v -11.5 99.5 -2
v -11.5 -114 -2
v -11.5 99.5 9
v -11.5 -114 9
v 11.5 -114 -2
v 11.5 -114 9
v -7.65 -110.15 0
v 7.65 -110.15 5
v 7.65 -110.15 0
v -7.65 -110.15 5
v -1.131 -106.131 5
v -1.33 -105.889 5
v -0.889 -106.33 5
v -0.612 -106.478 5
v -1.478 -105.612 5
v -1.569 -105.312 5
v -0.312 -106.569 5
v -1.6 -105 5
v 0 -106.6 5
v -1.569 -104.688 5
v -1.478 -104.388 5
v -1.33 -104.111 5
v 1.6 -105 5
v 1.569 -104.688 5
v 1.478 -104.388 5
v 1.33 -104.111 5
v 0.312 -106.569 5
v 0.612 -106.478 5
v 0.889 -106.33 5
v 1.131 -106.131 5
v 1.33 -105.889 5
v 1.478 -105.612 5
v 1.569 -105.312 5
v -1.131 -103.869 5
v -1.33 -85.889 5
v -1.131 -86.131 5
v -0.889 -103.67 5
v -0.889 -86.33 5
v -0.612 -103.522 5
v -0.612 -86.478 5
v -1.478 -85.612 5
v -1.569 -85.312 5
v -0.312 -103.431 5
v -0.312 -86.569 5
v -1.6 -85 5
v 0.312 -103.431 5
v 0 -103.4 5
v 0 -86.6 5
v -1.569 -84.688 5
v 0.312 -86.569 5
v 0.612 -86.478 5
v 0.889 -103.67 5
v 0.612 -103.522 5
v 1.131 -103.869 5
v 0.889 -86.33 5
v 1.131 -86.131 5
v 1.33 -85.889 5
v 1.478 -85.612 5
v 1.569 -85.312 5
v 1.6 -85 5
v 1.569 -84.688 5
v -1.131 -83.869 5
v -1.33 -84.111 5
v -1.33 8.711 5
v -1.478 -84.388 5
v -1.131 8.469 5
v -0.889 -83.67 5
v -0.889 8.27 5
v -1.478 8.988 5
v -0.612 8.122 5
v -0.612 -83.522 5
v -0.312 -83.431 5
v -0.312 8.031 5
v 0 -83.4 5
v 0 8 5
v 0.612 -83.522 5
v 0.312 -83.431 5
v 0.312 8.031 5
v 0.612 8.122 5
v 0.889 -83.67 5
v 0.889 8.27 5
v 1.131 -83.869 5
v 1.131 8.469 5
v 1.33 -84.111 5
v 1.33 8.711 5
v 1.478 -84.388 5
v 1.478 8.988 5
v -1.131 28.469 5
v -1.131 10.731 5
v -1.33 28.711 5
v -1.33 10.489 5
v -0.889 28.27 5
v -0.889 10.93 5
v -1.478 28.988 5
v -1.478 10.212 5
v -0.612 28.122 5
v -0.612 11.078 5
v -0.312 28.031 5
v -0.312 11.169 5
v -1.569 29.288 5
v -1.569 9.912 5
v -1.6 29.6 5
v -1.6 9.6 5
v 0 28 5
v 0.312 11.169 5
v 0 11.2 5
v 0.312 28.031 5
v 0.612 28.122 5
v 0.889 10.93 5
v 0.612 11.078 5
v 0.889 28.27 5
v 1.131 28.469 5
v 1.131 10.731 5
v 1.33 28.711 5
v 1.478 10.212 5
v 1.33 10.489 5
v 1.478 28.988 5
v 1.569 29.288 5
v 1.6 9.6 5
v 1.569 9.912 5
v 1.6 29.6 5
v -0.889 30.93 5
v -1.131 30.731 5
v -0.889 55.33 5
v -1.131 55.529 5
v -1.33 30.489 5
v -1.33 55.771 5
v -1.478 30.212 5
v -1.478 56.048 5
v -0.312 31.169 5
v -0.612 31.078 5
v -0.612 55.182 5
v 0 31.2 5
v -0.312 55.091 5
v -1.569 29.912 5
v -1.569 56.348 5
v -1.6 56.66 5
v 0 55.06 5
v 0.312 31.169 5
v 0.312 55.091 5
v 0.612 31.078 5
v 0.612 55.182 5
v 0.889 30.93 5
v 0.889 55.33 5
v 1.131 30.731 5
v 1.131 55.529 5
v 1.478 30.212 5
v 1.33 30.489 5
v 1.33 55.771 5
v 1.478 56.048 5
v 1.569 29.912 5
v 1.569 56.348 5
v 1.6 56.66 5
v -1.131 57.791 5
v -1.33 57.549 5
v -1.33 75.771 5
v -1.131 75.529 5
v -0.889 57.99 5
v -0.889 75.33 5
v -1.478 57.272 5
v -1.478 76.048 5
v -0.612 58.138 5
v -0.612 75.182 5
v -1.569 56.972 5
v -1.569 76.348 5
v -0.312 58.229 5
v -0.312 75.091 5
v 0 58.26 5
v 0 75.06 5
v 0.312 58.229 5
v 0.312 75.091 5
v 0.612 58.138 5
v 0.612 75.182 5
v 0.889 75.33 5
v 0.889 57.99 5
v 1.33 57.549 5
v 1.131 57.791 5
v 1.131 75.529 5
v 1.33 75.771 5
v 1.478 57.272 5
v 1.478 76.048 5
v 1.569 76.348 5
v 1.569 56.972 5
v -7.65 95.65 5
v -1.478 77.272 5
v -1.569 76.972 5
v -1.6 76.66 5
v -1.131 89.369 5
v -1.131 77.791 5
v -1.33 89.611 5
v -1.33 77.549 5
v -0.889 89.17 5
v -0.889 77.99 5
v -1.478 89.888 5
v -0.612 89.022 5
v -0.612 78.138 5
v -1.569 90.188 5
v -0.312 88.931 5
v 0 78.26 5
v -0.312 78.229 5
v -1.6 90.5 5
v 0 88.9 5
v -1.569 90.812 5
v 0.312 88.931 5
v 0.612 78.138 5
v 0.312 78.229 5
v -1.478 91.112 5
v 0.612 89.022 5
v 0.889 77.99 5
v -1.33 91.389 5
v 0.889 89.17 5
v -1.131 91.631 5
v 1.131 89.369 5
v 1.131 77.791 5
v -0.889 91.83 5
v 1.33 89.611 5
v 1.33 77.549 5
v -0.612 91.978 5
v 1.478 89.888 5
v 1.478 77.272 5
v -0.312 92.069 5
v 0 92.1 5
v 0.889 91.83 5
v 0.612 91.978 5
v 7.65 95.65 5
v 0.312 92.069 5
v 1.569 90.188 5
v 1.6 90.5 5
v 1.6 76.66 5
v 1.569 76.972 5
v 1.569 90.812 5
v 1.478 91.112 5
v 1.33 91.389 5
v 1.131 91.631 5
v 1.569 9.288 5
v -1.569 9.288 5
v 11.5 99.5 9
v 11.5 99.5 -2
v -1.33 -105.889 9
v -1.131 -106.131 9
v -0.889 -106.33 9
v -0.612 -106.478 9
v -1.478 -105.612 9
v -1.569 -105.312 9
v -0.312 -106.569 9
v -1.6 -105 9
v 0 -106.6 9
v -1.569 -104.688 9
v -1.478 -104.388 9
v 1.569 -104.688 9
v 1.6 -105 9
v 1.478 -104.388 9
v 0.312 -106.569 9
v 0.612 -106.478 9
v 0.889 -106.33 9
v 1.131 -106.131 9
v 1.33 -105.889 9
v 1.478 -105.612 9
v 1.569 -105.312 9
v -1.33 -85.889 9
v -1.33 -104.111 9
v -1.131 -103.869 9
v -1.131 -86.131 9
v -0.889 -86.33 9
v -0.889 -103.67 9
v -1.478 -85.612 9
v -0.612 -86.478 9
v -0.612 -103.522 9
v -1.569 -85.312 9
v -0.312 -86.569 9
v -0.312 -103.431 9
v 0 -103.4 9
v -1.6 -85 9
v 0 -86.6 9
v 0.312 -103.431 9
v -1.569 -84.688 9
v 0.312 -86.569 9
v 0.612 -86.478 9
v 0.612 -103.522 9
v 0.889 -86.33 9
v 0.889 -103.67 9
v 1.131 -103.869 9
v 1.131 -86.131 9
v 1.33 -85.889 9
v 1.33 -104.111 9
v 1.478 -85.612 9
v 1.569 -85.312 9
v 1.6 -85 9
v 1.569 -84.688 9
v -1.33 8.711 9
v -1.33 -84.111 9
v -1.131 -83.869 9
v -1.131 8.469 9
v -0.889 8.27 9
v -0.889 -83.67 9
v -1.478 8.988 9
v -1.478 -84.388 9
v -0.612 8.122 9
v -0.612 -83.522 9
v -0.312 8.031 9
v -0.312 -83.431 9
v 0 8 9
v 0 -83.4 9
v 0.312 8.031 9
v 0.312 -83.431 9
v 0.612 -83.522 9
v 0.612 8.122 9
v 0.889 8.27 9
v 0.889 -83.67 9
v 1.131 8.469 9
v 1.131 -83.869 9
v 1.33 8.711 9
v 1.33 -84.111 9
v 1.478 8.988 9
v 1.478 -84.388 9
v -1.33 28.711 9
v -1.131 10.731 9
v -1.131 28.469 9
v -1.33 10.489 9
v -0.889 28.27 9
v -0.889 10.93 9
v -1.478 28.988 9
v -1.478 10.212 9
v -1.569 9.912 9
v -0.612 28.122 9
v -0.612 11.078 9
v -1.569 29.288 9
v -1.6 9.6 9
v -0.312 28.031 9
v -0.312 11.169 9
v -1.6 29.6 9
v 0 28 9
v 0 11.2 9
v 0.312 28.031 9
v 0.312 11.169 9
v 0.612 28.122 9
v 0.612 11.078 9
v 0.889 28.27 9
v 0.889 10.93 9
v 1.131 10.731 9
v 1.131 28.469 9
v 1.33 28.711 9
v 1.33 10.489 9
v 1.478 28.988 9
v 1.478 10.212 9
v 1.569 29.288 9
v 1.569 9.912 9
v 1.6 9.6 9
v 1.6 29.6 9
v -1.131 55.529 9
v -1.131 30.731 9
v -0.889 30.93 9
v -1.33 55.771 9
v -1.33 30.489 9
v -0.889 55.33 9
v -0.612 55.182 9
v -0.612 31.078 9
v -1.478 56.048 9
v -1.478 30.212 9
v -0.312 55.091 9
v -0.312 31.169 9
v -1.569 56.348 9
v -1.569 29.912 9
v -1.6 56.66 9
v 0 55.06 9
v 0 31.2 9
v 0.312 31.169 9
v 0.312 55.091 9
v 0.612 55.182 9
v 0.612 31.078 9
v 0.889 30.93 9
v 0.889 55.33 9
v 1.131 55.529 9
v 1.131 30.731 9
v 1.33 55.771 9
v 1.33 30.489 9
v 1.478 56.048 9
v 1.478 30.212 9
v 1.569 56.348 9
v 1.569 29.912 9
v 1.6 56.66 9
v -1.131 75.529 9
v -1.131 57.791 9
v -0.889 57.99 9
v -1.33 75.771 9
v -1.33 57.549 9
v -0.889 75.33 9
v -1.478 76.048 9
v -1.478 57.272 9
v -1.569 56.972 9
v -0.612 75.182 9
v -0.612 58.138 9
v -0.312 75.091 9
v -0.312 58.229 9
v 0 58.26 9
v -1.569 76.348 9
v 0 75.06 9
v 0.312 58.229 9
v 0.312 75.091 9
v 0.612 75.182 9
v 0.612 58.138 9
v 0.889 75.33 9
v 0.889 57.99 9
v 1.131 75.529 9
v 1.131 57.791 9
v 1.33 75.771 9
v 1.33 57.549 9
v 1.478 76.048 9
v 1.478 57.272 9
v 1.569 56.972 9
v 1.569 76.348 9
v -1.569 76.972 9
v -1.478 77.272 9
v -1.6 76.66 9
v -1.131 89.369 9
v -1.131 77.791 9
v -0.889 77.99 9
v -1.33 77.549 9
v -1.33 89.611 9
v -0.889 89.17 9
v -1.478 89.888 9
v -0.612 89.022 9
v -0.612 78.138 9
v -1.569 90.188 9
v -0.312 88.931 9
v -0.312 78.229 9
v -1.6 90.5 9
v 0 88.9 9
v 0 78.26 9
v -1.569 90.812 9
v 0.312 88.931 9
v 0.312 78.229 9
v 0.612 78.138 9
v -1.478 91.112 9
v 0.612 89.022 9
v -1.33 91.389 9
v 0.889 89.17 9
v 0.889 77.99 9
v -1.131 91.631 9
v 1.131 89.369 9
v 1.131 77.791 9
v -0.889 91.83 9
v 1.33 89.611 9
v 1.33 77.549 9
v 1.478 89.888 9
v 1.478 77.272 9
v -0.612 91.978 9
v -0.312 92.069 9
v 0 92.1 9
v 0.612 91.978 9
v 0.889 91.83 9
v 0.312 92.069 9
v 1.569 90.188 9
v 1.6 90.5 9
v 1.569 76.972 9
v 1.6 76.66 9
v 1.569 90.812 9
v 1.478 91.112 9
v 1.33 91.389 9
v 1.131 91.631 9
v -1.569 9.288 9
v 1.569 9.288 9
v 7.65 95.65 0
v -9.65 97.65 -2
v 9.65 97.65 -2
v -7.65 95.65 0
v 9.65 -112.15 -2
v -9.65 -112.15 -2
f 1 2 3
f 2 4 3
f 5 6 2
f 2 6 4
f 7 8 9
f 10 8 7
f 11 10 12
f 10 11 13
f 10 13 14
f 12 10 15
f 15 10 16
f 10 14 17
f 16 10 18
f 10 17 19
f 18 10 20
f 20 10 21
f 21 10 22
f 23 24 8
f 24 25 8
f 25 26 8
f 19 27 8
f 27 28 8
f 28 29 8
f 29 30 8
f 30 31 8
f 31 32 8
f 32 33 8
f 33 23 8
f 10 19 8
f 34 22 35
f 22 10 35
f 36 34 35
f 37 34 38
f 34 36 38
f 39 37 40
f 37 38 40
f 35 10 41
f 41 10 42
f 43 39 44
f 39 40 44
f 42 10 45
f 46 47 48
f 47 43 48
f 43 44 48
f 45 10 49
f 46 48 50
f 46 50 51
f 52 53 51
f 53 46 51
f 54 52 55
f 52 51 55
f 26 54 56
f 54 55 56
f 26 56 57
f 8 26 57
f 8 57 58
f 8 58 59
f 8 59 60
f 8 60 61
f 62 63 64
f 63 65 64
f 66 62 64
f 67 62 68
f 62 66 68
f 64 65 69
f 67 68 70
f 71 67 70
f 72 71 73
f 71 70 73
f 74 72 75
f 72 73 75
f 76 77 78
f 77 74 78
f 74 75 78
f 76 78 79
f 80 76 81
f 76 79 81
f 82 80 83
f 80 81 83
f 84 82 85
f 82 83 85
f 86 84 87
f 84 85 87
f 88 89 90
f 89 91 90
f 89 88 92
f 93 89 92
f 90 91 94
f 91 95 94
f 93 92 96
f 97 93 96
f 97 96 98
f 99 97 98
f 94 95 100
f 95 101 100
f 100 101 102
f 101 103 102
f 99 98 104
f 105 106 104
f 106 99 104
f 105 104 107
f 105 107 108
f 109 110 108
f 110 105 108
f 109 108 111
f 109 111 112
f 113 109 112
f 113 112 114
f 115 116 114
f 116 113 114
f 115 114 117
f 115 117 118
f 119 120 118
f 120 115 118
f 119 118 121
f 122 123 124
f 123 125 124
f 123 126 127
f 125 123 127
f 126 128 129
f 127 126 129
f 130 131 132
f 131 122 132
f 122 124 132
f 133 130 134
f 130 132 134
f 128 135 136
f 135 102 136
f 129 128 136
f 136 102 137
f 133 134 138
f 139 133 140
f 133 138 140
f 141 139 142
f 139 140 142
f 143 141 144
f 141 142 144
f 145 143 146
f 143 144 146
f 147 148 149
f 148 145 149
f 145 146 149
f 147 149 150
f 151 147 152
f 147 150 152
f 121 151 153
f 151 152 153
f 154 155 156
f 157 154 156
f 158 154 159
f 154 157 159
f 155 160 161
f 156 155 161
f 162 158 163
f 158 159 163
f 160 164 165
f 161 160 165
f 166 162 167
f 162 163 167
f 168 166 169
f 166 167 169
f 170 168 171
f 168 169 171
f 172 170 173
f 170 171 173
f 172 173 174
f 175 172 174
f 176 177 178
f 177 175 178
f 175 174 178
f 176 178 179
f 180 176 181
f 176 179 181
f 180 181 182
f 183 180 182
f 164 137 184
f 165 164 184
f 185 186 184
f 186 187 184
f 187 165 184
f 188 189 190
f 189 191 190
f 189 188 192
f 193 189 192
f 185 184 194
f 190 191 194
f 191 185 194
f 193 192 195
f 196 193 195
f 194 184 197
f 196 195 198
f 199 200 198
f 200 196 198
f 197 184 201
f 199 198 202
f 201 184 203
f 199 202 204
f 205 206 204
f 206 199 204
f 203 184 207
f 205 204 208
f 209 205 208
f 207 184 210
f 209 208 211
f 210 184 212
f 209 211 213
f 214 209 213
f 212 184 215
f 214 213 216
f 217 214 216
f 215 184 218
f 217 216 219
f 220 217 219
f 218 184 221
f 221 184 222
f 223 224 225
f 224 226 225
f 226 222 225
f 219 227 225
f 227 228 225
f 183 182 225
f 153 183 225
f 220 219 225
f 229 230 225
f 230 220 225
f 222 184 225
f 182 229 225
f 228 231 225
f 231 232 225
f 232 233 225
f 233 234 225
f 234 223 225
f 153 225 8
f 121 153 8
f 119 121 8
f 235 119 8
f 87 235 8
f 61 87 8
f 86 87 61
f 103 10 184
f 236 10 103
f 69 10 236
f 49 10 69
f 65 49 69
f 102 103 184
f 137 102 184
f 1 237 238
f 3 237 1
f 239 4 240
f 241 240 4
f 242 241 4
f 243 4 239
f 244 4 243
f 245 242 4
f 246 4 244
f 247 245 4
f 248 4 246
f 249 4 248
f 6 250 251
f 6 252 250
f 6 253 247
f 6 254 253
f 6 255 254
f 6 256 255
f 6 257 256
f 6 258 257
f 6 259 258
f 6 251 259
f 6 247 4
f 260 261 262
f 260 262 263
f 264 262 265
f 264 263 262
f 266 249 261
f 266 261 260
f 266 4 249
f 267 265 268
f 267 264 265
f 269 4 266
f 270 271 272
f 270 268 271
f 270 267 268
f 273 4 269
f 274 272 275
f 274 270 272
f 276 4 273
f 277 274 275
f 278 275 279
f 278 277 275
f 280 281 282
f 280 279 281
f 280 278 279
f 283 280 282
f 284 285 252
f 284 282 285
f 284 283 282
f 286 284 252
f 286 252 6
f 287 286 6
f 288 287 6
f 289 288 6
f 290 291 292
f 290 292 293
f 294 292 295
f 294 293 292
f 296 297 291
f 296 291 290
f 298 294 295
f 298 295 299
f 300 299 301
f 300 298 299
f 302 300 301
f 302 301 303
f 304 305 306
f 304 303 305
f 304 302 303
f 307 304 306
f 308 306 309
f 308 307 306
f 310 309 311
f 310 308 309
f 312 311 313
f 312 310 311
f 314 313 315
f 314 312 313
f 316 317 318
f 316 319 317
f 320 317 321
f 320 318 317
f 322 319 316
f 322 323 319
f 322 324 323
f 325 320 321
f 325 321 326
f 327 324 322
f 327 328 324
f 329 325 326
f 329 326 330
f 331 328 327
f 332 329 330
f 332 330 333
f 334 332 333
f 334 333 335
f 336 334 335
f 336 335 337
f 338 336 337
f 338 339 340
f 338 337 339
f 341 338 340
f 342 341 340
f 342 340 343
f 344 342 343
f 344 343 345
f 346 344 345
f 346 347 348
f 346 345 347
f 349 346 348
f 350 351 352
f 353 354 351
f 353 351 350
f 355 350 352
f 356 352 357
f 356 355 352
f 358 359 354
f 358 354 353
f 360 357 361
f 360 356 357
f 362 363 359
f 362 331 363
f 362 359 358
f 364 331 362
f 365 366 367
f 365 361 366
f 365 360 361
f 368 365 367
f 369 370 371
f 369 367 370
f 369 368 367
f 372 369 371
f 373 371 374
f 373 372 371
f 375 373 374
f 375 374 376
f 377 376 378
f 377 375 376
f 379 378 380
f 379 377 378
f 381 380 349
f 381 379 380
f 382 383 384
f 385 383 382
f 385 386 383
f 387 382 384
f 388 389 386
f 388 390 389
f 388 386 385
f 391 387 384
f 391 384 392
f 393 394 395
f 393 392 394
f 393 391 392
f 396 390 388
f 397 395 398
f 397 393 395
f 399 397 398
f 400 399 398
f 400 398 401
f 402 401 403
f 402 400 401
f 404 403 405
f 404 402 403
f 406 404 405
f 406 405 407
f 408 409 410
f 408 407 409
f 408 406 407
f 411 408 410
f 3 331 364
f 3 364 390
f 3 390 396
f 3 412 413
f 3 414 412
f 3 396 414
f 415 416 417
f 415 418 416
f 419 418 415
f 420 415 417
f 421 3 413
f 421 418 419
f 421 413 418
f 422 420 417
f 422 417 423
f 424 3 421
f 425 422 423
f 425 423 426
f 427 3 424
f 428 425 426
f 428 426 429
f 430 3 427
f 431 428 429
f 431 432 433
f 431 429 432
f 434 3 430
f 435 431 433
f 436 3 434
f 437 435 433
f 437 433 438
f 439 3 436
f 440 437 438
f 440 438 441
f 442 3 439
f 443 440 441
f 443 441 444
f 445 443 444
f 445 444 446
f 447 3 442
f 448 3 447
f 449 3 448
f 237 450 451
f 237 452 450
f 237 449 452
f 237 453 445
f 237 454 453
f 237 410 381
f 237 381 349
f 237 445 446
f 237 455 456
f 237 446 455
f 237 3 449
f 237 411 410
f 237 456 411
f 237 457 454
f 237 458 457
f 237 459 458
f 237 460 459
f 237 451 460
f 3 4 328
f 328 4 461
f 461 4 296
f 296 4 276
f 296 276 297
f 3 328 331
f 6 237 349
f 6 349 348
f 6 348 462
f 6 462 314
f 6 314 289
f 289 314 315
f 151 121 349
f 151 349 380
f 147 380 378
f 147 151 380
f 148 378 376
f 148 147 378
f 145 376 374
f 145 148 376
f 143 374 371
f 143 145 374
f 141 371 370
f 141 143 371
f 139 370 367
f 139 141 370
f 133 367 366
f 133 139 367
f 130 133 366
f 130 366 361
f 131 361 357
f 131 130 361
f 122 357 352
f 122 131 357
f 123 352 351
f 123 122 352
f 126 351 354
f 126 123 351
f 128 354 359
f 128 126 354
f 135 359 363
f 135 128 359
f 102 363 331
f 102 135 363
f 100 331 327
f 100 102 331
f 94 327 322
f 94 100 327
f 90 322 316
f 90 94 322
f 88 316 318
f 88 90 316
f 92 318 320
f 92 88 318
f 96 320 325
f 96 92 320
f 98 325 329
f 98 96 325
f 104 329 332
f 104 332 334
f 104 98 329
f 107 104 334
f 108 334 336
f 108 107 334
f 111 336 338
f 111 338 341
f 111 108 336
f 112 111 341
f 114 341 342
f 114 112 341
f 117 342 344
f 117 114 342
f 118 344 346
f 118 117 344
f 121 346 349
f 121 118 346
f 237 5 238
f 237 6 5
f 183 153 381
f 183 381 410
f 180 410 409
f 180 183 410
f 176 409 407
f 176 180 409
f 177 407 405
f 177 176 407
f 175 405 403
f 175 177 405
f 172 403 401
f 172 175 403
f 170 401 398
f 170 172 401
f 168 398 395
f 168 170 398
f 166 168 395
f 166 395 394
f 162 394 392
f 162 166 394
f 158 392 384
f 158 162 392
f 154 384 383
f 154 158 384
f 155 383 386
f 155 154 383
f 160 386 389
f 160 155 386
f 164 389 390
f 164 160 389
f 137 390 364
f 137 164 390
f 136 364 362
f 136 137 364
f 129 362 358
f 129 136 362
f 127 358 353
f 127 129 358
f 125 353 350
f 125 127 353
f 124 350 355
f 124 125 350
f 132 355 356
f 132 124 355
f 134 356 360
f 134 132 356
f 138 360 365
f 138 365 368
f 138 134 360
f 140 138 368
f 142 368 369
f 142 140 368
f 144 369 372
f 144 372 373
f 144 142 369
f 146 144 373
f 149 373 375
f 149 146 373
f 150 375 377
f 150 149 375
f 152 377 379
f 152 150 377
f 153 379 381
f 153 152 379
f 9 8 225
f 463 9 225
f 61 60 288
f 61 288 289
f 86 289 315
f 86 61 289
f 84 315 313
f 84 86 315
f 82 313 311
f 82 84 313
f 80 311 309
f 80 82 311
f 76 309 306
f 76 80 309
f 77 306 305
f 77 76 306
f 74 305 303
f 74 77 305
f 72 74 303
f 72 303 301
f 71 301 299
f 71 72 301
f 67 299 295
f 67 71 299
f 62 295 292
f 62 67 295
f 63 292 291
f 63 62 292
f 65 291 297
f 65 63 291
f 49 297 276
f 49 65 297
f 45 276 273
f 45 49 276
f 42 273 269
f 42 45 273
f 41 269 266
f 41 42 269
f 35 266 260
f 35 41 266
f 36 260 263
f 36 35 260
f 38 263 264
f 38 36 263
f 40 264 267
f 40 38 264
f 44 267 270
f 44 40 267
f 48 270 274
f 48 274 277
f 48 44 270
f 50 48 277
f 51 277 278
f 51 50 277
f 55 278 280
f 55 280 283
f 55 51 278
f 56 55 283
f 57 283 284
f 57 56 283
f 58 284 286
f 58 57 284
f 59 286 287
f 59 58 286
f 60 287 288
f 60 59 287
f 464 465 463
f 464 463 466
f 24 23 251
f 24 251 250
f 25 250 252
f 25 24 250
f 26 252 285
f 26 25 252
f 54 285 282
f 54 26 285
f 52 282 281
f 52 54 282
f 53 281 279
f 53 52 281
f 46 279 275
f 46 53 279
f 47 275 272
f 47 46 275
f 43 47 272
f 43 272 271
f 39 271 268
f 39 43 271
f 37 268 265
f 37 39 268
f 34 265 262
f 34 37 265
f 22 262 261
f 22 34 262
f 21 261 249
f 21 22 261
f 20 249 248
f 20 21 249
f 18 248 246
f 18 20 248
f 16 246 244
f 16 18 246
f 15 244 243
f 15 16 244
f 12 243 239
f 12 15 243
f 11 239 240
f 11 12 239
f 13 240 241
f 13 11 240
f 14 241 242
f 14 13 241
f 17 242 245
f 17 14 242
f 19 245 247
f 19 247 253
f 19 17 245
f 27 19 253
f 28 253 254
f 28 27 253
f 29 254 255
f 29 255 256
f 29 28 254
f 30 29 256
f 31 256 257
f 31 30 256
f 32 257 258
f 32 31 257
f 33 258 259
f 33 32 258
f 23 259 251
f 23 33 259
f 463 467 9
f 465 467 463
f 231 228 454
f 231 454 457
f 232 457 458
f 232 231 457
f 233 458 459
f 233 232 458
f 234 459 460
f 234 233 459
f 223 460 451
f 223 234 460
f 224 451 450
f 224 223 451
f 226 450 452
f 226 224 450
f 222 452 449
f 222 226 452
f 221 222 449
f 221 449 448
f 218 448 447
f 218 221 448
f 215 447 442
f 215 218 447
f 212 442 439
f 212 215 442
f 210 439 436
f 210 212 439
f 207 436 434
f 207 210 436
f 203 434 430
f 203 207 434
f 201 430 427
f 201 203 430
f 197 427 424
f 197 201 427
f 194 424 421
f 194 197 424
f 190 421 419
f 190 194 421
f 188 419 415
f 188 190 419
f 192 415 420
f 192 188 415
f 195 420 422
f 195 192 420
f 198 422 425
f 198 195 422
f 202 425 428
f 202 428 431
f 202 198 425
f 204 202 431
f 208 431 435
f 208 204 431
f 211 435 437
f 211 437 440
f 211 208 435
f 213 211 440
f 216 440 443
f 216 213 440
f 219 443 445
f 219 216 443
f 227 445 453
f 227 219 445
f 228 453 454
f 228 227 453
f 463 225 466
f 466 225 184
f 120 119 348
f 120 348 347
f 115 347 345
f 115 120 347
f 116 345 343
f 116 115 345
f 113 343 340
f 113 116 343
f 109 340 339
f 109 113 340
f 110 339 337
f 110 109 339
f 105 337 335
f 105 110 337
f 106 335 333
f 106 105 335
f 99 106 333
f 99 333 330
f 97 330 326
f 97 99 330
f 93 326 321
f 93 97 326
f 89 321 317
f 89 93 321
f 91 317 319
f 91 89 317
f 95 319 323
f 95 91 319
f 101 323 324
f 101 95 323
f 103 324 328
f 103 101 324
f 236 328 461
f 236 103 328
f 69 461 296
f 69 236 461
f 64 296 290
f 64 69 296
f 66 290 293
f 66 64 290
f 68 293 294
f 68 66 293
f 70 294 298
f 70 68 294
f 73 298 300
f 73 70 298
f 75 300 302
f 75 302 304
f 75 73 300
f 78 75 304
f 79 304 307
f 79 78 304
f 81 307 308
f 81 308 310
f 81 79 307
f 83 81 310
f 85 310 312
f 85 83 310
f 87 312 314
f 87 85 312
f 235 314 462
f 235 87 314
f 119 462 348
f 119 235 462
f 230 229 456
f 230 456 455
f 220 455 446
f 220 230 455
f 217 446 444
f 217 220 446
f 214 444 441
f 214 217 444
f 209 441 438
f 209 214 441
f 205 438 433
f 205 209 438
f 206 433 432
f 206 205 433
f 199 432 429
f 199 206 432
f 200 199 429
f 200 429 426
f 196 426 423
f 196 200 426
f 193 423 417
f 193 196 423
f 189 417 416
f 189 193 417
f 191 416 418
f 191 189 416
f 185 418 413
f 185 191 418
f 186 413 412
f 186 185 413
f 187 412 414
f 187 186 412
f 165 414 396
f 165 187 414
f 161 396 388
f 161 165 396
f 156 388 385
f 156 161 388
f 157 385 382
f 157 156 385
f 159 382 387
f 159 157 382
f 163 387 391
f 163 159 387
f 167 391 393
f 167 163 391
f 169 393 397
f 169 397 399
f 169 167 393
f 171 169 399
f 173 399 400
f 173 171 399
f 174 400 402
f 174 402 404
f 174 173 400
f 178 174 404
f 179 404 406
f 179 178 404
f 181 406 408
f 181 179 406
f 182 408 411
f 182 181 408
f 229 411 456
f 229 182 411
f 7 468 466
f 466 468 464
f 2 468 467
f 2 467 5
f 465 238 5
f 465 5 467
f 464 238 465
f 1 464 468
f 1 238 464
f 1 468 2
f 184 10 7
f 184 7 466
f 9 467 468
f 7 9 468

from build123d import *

# Parameters (mm, degrees)
SKETCH_1_W      = 23
SKETCH_1_H      = 213.5
SKETCH_1_R      = 1.6
EXTRUDE_1_DEPTH = 4
SKETCH_2_W      = 23
SKETCH_2_H      = 213.5
SKETCH_2_W_2    = 15.3
SKETCH_2_H_2    = 205.8
EXTRUDE_2_DEPTH = 7
CHAMFER_1_SIZE  = 2


with BuildPart() as part:
    # ｽｹｯﾁ1 → ﾎﾞｽ - 押し出し1 (new body)
    with BuildSketch(Plane.XY.offset(5)):
        with Locations((0, -7.25)):
            Rectangle(SKETCH_1_W, SKETCH_1_H)
        with Locations((0, -105)):
            Circle(SKETCH_1_R, mode=Mode.SUBTRACT)
        with Locations((0, -85)):
            Circle(SKETCH_1_R, mode=Mode.SUBTRACT)
        with Locations((0, 90.5)):
            Circle(SKETCH_1_R, mode=Mode.SUBTRACT)
        with Locations((0, 76.66)):
            Circle(SKETCH_1_R, mode=Mode.SUBTRACT)
        with Locations((0, 56.66)):
            Circle(SKETCH_1_R, mode=Mode.SUBTRACT)
        with Locations((0, 29.6)):
            Circle(SKETCH_1_R, mode=Mode.SUBTRACT)
        with Locations((0, 9.6)):
            Circle(SKETCH_1_R, mode=Mode.SUBTRACT)
    extrude(amount=EXTRUDE_1_DEPTH)

    # ｽｹｯﾁ2 → ﾎﾞｽ - 押し出し2 (add)
    with BuildSketch(Plane(origin=(0, 0, 5), x_dir=(-1, 0, 0), z_dir=(0, 0, -1))):
        with Locations((0, -7.25)):
            Rectangle(SKETCH_2_W, SKETCH_2_H)
        with Locations((0, -7.25)):
            Rectangle(SKETCH_2_W_2, SKETCH_2_H_2, mode=Mode.SUBTRACT)
    extrude(amount=EXTRUDE_2_DEPTH)

    # 面取り1
    chamfer_1_edges = [part.edges().sort_by_distance(p)[0] for p in [
        (0, -110.15, -2),
        (-7.65, -7.25, -2),
        (0, 95.65, -2),
        (7.65, -7.25, -2),
    ]]
    chamfer(chamfer_1_edges, length=CHAMFER_1_SIZE)


solid = part.part
